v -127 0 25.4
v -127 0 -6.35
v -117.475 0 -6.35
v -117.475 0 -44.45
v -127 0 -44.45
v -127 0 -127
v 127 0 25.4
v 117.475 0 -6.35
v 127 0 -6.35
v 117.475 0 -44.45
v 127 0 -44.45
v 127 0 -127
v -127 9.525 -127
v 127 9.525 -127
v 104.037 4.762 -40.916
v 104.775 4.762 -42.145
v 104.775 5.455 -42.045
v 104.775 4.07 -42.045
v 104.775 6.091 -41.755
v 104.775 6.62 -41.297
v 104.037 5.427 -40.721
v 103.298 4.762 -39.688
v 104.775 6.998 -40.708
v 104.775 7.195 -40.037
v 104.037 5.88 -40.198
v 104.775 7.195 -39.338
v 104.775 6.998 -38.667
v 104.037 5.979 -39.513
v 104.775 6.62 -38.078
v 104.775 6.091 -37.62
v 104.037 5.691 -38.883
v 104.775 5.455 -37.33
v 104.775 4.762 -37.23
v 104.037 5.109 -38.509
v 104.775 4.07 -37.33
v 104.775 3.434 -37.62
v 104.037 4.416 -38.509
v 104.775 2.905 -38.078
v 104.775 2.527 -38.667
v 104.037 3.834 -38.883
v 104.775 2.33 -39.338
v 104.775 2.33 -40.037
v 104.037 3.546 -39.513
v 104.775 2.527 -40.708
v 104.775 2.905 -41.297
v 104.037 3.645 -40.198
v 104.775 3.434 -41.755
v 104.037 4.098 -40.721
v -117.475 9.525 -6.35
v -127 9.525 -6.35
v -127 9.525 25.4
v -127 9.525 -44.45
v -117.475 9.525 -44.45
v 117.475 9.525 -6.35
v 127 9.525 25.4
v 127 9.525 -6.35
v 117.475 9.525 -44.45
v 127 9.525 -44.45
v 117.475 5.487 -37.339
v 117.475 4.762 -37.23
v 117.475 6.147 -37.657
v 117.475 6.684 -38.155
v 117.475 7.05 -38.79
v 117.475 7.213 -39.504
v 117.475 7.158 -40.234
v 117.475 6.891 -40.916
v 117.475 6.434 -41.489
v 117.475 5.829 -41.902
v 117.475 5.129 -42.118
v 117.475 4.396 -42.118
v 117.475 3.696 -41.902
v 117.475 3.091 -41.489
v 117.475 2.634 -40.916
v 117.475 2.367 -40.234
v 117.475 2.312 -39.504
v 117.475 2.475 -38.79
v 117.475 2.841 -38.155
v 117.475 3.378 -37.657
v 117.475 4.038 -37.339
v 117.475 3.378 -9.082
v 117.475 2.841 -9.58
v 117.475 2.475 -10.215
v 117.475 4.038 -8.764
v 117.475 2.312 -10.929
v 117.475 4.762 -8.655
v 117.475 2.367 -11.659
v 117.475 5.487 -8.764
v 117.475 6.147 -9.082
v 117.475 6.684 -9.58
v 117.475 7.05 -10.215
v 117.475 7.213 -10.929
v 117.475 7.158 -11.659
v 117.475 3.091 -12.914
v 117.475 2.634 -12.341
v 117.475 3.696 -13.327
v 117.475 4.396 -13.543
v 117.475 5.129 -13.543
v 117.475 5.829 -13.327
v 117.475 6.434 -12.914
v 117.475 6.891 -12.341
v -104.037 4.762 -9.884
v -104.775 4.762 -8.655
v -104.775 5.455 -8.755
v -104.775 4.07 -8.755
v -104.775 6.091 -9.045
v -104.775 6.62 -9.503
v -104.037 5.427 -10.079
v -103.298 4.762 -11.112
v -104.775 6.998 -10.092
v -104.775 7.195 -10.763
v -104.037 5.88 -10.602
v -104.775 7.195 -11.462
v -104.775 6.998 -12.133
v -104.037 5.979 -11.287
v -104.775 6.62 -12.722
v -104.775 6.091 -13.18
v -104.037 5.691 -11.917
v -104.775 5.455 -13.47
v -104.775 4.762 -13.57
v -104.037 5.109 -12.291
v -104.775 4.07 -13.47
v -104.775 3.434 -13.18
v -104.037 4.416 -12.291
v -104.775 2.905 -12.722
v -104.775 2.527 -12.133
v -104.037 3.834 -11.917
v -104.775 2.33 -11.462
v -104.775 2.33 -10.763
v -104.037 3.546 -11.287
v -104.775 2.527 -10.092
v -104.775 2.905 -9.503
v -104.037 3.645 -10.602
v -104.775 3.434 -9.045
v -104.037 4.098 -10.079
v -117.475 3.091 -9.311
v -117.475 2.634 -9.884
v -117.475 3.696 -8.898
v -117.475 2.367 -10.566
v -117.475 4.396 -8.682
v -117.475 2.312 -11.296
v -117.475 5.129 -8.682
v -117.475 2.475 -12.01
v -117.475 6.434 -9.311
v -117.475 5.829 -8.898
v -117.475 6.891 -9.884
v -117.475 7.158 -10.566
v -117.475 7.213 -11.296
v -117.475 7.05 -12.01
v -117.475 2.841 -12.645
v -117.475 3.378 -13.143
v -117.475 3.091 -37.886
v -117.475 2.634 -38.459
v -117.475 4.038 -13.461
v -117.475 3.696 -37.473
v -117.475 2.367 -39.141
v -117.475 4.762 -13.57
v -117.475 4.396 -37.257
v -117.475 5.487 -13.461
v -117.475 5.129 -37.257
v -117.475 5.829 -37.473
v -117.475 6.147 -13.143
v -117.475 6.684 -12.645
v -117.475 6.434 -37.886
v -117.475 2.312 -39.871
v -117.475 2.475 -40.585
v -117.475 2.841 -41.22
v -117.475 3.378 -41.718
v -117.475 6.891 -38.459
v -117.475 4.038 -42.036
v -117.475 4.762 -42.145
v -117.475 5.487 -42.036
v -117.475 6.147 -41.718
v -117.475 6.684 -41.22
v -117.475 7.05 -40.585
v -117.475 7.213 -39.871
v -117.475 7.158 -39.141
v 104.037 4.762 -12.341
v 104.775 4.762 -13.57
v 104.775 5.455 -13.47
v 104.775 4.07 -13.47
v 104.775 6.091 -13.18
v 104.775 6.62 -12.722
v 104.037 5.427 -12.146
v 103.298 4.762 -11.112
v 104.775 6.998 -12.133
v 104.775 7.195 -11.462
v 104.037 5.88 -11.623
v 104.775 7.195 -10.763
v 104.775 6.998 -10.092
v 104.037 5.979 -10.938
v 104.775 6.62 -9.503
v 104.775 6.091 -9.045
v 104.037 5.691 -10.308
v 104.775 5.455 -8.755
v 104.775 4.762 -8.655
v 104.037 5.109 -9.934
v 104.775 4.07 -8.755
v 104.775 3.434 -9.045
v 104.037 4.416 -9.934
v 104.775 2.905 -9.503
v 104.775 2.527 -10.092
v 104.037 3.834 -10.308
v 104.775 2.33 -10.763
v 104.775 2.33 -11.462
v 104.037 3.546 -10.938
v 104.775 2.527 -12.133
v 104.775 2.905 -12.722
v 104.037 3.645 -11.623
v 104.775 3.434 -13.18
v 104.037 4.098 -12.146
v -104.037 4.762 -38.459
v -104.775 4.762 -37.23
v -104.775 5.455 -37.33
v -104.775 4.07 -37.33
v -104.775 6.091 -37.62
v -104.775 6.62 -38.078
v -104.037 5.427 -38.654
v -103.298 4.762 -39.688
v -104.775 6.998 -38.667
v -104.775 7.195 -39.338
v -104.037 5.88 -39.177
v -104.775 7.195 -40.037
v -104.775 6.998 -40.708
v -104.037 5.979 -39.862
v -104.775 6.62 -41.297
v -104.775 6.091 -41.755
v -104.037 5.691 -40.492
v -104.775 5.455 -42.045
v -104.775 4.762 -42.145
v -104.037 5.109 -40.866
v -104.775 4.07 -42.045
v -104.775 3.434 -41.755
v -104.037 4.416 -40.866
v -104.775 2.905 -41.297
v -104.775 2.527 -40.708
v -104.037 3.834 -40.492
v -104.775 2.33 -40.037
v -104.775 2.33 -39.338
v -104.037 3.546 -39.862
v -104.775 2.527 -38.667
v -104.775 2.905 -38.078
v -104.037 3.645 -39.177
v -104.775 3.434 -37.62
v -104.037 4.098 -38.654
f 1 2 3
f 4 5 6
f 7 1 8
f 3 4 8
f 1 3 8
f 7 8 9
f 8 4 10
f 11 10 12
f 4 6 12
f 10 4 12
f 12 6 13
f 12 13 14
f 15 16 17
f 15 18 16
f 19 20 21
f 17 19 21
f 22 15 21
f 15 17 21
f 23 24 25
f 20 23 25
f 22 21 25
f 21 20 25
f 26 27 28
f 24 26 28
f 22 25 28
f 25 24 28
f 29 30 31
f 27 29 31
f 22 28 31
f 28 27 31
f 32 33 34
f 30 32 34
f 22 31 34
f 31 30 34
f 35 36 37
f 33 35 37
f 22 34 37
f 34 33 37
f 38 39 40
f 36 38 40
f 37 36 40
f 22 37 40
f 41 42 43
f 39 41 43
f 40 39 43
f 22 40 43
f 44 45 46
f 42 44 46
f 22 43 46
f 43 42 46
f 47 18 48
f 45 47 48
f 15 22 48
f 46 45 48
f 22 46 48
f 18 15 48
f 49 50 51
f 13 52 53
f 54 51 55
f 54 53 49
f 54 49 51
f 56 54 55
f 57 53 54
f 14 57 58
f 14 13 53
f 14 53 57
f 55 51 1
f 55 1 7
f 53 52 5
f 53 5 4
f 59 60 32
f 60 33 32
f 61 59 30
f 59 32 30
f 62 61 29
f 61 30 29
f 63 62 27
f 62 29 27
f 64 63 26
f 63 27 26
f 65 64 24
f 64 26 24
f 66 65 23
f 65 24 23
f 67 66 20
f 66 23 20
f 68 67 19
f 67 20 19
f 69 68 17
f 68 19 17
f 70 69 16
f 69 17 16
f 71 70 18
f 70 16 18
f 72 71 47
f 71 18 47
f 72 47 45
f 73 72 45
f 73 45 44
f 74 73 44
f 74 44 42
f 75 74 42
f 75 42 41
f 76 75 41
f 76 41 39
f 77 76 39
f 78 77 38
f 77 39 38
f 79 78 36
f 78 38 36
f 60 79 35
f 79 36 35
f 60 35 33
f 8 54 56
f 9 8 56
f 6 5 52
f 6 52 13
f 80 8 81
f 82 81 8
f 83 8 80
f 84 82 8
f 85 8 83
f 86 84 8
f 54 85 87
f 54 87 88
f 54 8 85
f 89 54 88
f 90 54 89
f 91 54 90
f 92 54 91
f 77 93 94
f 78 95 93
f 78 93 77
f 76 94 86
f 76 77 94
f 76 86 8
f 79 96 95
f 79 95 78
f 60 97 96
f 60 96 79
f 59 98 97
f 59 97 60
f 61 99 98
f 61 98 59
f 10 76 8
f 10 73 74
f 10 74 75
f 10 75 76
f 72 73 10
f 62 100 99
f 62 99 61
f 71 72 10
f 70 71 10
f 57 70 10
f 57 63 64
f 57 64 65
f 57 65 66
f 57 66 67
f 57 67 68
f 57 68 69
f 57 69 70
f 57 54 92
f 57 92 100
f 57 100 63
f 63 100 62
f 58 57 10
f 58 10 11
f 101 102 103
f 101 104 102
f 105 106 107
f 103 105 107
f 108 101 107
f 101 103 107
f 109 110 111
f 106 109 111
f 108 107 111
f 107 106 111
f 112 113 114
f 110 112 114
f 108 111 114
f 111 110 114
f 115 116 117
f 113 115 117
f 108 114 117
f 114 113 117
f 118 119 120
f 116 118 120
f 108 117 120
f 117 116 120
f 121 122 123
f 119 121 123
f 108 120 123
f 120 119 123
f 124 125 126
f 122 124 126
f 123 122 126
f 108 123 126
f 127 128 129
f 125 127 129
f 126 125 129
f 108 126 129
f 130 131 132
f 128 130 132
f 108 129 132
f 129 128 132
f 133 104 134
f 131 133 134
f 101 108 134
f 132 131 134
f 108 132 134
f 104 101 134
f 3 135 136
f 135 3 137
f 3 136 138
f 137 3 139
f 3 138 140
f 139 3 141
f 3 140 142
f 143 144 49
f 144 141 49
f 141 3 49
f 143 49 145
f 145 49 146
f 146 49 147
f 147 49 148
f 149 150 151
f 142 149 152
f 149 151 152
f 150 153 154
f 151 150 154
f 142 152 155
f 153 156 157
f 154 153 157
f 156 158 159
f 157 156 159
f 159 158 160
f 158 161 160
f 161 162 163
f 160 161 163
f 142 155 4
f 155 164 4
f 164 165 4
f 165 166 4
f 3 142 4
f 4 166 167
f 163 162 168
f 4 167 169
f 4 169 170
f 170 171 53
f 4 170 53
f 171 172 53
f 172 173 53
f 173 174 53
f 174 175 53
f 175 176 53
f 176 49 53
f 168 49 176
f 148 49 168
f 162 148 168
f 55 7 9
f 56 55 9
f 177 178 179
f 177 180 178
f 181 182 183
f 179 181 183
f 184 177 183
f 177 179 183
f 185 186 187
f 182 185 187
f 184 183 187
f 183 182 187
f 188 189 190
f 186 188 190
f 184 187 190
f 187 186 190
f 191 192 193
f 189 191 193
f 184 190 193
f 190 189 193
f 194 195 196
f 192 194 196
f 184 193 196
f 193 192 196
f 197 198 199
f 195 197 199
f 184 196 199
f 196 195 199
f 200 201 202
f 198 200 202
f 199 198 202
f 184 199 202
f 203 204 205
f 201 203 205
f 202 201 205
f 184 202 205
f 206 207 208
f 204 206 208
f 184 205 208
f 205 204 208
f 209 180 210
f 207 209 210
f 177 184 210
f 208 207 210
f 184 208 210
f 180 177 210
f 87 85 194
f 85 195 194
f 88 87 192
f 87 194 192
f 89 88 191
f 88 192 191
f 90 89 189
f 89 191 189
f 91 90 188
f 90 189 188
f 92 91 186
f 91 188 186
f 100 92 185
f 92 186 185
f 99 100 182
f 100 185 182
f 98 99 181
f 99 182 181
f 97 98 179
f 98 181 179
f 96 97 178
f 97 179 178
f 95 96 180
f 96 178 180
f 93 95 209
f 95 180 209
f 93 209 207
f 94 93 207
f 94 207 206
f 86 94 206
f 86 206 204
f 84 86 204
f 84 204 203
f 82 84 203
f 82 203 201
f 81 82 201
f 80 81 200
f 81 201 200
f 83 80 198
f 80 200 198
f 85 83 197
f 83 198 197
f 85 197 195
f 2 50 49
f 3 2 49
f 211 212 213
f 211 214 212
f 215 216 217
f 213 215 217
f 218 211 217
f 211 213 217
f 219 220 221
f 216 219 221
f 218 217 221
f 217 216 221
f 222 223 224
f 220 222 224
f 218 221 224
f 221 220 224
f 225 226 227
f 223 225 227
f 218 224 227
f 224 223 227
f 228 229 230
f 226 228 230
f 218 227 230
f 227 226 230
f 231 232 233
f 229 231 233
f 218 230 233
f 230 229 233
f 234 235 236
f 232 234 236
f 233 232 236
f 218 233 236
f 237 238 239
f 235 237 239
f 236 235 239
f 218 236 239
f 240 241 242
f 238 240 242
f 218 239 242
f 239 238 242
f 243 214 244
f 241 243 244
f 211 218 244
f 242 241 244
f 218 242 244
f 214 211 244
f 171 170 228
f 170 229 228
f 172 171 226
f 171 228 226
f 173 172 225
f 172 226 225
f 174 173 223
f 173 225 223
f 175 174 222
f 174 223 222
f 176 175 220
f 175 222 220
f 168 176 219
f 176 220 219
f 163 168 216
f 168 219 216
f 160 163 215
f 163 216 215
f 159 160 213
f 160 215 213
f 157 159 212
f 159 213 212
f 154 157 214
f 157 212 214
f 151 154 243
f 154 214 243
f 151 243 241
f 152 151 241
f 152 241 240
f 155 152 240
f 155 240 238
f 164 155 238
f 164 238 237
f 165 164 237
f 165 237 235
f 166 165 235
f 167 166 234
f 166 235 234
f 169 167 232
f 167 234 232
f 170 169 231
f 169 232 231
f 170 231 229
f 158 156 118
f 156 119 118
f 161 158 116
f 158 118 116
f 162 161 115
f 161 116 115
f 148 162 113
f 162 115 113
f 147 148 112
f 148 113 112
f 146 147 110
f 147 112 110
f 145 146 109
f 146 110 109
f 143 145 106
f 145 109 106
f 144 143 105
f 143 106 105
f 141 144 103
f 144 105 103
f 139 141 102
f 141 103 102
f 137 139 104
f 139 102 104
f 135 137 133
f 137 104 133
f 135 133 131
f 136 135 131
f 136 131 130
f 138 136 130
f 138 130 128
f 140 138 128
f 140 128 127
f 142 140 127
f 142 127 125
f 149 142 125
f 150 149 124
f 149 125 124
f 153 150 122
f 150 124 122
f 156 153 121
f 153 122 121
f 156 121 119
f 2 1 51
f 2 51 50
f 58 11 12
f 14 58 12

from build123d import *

# Parameters (mm, degrees)
SKETCH1_W                        = 254
SKETCH1_H                        = 254
BOSS_EXTRUDE1_DEPTH              = 9.525
SKETCH7_W                        = 9.525
SKETCH7_H                        = 38.1
CUT_EXTRUDE4_DEPTH               = 180.857514786
F_10_0_1935_DIAMETER_HOLE1_D     = 4.9149
F_10_0_1935_DIAMETER_HOLE1_DEPTH = 12.7
F_10_0_1935_DIAMETER_HOLE1_TIP   = 1.476584928
F_10_0_1935_DIAMETER_HOLE3_D     = 4.9149
F_10_0_1935_DIAMETER_HOLE3_DEPTH = 12.7
F_10_0_1935_DIAMETER_HOLE3_TIP   = 1.476584928
SKETCH16_W                       = 254
SKETCH16_H                       = 101.6
CUT_EXTRUDE5_DEPTH               = 180.857514786


with BuildPart() as part:
    # Sketch1 → Boss-Extrude1 (new body)
    with BuildSketch(Plane(origin=(0, 0, 0), x_dir=(1, 0, 0), z_dir=(0, 1, 0))):
        Rectangle(SKETCH1_W, SKETCH1_H)
    extrude(amount=BOSS_EXTRUDE1_DEPTH)

    # Sketch7 → Cut-Extrude4 (cut, through all)
    with BuildSketch(Plane(origin=(0, 9.525, 0), x_dir=(1, 0, 0), z_dir=(0, 1, 0))):
        with Locations((-122.2375, 25.4)):
            Rectangle(SKETCH7_W, SKETCH7_H)
        with Locations((122.2375, 25.4)):
            Rectangle(SKETCH7_W, SKETCH7_H)
    extrude(amount=-CUT_EXTRUDE4_DEPTH, mode=Mode.SUBTRACT)

    # #10 (0.1935) Diameter Hole1
    with Locations(Plane(origin=(117.475, 0, 0), x_dir=(0, 0, -1), z_dir=(1, 0, 0))):
        with Locations((11.1125, 4.7625), (39.6875, 4.7625)):
            Hole(F_10_0_1935_DIAMETER_HOLE1_D / 2, depth=F_10_0_1935_DIAMETER_HOLE1_DEPTH)
            with Locations((0, 0, -(F_10_0_1935_DIAMETER_HOLE1_DEPTH + F_10_0_1935_DIAMETER_HOLE1_TIP / 2))):  # 118° drill point
                Cone(0, F_10_0_1935_DIAMETER_HOLE1_D / 2, F_10_0_1935_DIAMETER_HOLE1_TIP, mode=Mode.SUBTRACT)

    # #10 (0.1935) Diameter Hole3
    with Locations(Plane.ZY.offset(117.475)):
        with Locations((-39.6875, 4.7625), (-11.1125, 4.7625)):
            Hole(F_10_0_1935_DIAMETER_HOLE3_D / 2, depth=F_10_0_1935_DIAMETER_HOLE3_DEPTH)
            with Locations((0, 0, -(F_10_0_1935_DIAMETER_HOLE3_DEPTH + F_10_0_1935_DIAMETER_HOLE3_TIP / 2))):  # 118° drill point
                Cone(0, F_10_0_1935_DIAMETER_HOLE3_D / 2, F_10_0_1935_DIAMETER_HOLE3_TIP, mode=Mode.SUBTRACT)

    # Sketch16 → Cut-Extrude5 (cut, through all)
    with BuildSketch(Plane(origin=(0, 9.525, 0), x_dir=(1, 0, 0), z_dir=(0, 1, 0))):
        with Locations((0, -76.2)):
            Rectangle(SKETCH16_W, SKETCH16_H)
    extrude(amount=-CUT_EXTRUDE5_DEPTH, mode=Mode.SUBTRACT)


solid = part.part
